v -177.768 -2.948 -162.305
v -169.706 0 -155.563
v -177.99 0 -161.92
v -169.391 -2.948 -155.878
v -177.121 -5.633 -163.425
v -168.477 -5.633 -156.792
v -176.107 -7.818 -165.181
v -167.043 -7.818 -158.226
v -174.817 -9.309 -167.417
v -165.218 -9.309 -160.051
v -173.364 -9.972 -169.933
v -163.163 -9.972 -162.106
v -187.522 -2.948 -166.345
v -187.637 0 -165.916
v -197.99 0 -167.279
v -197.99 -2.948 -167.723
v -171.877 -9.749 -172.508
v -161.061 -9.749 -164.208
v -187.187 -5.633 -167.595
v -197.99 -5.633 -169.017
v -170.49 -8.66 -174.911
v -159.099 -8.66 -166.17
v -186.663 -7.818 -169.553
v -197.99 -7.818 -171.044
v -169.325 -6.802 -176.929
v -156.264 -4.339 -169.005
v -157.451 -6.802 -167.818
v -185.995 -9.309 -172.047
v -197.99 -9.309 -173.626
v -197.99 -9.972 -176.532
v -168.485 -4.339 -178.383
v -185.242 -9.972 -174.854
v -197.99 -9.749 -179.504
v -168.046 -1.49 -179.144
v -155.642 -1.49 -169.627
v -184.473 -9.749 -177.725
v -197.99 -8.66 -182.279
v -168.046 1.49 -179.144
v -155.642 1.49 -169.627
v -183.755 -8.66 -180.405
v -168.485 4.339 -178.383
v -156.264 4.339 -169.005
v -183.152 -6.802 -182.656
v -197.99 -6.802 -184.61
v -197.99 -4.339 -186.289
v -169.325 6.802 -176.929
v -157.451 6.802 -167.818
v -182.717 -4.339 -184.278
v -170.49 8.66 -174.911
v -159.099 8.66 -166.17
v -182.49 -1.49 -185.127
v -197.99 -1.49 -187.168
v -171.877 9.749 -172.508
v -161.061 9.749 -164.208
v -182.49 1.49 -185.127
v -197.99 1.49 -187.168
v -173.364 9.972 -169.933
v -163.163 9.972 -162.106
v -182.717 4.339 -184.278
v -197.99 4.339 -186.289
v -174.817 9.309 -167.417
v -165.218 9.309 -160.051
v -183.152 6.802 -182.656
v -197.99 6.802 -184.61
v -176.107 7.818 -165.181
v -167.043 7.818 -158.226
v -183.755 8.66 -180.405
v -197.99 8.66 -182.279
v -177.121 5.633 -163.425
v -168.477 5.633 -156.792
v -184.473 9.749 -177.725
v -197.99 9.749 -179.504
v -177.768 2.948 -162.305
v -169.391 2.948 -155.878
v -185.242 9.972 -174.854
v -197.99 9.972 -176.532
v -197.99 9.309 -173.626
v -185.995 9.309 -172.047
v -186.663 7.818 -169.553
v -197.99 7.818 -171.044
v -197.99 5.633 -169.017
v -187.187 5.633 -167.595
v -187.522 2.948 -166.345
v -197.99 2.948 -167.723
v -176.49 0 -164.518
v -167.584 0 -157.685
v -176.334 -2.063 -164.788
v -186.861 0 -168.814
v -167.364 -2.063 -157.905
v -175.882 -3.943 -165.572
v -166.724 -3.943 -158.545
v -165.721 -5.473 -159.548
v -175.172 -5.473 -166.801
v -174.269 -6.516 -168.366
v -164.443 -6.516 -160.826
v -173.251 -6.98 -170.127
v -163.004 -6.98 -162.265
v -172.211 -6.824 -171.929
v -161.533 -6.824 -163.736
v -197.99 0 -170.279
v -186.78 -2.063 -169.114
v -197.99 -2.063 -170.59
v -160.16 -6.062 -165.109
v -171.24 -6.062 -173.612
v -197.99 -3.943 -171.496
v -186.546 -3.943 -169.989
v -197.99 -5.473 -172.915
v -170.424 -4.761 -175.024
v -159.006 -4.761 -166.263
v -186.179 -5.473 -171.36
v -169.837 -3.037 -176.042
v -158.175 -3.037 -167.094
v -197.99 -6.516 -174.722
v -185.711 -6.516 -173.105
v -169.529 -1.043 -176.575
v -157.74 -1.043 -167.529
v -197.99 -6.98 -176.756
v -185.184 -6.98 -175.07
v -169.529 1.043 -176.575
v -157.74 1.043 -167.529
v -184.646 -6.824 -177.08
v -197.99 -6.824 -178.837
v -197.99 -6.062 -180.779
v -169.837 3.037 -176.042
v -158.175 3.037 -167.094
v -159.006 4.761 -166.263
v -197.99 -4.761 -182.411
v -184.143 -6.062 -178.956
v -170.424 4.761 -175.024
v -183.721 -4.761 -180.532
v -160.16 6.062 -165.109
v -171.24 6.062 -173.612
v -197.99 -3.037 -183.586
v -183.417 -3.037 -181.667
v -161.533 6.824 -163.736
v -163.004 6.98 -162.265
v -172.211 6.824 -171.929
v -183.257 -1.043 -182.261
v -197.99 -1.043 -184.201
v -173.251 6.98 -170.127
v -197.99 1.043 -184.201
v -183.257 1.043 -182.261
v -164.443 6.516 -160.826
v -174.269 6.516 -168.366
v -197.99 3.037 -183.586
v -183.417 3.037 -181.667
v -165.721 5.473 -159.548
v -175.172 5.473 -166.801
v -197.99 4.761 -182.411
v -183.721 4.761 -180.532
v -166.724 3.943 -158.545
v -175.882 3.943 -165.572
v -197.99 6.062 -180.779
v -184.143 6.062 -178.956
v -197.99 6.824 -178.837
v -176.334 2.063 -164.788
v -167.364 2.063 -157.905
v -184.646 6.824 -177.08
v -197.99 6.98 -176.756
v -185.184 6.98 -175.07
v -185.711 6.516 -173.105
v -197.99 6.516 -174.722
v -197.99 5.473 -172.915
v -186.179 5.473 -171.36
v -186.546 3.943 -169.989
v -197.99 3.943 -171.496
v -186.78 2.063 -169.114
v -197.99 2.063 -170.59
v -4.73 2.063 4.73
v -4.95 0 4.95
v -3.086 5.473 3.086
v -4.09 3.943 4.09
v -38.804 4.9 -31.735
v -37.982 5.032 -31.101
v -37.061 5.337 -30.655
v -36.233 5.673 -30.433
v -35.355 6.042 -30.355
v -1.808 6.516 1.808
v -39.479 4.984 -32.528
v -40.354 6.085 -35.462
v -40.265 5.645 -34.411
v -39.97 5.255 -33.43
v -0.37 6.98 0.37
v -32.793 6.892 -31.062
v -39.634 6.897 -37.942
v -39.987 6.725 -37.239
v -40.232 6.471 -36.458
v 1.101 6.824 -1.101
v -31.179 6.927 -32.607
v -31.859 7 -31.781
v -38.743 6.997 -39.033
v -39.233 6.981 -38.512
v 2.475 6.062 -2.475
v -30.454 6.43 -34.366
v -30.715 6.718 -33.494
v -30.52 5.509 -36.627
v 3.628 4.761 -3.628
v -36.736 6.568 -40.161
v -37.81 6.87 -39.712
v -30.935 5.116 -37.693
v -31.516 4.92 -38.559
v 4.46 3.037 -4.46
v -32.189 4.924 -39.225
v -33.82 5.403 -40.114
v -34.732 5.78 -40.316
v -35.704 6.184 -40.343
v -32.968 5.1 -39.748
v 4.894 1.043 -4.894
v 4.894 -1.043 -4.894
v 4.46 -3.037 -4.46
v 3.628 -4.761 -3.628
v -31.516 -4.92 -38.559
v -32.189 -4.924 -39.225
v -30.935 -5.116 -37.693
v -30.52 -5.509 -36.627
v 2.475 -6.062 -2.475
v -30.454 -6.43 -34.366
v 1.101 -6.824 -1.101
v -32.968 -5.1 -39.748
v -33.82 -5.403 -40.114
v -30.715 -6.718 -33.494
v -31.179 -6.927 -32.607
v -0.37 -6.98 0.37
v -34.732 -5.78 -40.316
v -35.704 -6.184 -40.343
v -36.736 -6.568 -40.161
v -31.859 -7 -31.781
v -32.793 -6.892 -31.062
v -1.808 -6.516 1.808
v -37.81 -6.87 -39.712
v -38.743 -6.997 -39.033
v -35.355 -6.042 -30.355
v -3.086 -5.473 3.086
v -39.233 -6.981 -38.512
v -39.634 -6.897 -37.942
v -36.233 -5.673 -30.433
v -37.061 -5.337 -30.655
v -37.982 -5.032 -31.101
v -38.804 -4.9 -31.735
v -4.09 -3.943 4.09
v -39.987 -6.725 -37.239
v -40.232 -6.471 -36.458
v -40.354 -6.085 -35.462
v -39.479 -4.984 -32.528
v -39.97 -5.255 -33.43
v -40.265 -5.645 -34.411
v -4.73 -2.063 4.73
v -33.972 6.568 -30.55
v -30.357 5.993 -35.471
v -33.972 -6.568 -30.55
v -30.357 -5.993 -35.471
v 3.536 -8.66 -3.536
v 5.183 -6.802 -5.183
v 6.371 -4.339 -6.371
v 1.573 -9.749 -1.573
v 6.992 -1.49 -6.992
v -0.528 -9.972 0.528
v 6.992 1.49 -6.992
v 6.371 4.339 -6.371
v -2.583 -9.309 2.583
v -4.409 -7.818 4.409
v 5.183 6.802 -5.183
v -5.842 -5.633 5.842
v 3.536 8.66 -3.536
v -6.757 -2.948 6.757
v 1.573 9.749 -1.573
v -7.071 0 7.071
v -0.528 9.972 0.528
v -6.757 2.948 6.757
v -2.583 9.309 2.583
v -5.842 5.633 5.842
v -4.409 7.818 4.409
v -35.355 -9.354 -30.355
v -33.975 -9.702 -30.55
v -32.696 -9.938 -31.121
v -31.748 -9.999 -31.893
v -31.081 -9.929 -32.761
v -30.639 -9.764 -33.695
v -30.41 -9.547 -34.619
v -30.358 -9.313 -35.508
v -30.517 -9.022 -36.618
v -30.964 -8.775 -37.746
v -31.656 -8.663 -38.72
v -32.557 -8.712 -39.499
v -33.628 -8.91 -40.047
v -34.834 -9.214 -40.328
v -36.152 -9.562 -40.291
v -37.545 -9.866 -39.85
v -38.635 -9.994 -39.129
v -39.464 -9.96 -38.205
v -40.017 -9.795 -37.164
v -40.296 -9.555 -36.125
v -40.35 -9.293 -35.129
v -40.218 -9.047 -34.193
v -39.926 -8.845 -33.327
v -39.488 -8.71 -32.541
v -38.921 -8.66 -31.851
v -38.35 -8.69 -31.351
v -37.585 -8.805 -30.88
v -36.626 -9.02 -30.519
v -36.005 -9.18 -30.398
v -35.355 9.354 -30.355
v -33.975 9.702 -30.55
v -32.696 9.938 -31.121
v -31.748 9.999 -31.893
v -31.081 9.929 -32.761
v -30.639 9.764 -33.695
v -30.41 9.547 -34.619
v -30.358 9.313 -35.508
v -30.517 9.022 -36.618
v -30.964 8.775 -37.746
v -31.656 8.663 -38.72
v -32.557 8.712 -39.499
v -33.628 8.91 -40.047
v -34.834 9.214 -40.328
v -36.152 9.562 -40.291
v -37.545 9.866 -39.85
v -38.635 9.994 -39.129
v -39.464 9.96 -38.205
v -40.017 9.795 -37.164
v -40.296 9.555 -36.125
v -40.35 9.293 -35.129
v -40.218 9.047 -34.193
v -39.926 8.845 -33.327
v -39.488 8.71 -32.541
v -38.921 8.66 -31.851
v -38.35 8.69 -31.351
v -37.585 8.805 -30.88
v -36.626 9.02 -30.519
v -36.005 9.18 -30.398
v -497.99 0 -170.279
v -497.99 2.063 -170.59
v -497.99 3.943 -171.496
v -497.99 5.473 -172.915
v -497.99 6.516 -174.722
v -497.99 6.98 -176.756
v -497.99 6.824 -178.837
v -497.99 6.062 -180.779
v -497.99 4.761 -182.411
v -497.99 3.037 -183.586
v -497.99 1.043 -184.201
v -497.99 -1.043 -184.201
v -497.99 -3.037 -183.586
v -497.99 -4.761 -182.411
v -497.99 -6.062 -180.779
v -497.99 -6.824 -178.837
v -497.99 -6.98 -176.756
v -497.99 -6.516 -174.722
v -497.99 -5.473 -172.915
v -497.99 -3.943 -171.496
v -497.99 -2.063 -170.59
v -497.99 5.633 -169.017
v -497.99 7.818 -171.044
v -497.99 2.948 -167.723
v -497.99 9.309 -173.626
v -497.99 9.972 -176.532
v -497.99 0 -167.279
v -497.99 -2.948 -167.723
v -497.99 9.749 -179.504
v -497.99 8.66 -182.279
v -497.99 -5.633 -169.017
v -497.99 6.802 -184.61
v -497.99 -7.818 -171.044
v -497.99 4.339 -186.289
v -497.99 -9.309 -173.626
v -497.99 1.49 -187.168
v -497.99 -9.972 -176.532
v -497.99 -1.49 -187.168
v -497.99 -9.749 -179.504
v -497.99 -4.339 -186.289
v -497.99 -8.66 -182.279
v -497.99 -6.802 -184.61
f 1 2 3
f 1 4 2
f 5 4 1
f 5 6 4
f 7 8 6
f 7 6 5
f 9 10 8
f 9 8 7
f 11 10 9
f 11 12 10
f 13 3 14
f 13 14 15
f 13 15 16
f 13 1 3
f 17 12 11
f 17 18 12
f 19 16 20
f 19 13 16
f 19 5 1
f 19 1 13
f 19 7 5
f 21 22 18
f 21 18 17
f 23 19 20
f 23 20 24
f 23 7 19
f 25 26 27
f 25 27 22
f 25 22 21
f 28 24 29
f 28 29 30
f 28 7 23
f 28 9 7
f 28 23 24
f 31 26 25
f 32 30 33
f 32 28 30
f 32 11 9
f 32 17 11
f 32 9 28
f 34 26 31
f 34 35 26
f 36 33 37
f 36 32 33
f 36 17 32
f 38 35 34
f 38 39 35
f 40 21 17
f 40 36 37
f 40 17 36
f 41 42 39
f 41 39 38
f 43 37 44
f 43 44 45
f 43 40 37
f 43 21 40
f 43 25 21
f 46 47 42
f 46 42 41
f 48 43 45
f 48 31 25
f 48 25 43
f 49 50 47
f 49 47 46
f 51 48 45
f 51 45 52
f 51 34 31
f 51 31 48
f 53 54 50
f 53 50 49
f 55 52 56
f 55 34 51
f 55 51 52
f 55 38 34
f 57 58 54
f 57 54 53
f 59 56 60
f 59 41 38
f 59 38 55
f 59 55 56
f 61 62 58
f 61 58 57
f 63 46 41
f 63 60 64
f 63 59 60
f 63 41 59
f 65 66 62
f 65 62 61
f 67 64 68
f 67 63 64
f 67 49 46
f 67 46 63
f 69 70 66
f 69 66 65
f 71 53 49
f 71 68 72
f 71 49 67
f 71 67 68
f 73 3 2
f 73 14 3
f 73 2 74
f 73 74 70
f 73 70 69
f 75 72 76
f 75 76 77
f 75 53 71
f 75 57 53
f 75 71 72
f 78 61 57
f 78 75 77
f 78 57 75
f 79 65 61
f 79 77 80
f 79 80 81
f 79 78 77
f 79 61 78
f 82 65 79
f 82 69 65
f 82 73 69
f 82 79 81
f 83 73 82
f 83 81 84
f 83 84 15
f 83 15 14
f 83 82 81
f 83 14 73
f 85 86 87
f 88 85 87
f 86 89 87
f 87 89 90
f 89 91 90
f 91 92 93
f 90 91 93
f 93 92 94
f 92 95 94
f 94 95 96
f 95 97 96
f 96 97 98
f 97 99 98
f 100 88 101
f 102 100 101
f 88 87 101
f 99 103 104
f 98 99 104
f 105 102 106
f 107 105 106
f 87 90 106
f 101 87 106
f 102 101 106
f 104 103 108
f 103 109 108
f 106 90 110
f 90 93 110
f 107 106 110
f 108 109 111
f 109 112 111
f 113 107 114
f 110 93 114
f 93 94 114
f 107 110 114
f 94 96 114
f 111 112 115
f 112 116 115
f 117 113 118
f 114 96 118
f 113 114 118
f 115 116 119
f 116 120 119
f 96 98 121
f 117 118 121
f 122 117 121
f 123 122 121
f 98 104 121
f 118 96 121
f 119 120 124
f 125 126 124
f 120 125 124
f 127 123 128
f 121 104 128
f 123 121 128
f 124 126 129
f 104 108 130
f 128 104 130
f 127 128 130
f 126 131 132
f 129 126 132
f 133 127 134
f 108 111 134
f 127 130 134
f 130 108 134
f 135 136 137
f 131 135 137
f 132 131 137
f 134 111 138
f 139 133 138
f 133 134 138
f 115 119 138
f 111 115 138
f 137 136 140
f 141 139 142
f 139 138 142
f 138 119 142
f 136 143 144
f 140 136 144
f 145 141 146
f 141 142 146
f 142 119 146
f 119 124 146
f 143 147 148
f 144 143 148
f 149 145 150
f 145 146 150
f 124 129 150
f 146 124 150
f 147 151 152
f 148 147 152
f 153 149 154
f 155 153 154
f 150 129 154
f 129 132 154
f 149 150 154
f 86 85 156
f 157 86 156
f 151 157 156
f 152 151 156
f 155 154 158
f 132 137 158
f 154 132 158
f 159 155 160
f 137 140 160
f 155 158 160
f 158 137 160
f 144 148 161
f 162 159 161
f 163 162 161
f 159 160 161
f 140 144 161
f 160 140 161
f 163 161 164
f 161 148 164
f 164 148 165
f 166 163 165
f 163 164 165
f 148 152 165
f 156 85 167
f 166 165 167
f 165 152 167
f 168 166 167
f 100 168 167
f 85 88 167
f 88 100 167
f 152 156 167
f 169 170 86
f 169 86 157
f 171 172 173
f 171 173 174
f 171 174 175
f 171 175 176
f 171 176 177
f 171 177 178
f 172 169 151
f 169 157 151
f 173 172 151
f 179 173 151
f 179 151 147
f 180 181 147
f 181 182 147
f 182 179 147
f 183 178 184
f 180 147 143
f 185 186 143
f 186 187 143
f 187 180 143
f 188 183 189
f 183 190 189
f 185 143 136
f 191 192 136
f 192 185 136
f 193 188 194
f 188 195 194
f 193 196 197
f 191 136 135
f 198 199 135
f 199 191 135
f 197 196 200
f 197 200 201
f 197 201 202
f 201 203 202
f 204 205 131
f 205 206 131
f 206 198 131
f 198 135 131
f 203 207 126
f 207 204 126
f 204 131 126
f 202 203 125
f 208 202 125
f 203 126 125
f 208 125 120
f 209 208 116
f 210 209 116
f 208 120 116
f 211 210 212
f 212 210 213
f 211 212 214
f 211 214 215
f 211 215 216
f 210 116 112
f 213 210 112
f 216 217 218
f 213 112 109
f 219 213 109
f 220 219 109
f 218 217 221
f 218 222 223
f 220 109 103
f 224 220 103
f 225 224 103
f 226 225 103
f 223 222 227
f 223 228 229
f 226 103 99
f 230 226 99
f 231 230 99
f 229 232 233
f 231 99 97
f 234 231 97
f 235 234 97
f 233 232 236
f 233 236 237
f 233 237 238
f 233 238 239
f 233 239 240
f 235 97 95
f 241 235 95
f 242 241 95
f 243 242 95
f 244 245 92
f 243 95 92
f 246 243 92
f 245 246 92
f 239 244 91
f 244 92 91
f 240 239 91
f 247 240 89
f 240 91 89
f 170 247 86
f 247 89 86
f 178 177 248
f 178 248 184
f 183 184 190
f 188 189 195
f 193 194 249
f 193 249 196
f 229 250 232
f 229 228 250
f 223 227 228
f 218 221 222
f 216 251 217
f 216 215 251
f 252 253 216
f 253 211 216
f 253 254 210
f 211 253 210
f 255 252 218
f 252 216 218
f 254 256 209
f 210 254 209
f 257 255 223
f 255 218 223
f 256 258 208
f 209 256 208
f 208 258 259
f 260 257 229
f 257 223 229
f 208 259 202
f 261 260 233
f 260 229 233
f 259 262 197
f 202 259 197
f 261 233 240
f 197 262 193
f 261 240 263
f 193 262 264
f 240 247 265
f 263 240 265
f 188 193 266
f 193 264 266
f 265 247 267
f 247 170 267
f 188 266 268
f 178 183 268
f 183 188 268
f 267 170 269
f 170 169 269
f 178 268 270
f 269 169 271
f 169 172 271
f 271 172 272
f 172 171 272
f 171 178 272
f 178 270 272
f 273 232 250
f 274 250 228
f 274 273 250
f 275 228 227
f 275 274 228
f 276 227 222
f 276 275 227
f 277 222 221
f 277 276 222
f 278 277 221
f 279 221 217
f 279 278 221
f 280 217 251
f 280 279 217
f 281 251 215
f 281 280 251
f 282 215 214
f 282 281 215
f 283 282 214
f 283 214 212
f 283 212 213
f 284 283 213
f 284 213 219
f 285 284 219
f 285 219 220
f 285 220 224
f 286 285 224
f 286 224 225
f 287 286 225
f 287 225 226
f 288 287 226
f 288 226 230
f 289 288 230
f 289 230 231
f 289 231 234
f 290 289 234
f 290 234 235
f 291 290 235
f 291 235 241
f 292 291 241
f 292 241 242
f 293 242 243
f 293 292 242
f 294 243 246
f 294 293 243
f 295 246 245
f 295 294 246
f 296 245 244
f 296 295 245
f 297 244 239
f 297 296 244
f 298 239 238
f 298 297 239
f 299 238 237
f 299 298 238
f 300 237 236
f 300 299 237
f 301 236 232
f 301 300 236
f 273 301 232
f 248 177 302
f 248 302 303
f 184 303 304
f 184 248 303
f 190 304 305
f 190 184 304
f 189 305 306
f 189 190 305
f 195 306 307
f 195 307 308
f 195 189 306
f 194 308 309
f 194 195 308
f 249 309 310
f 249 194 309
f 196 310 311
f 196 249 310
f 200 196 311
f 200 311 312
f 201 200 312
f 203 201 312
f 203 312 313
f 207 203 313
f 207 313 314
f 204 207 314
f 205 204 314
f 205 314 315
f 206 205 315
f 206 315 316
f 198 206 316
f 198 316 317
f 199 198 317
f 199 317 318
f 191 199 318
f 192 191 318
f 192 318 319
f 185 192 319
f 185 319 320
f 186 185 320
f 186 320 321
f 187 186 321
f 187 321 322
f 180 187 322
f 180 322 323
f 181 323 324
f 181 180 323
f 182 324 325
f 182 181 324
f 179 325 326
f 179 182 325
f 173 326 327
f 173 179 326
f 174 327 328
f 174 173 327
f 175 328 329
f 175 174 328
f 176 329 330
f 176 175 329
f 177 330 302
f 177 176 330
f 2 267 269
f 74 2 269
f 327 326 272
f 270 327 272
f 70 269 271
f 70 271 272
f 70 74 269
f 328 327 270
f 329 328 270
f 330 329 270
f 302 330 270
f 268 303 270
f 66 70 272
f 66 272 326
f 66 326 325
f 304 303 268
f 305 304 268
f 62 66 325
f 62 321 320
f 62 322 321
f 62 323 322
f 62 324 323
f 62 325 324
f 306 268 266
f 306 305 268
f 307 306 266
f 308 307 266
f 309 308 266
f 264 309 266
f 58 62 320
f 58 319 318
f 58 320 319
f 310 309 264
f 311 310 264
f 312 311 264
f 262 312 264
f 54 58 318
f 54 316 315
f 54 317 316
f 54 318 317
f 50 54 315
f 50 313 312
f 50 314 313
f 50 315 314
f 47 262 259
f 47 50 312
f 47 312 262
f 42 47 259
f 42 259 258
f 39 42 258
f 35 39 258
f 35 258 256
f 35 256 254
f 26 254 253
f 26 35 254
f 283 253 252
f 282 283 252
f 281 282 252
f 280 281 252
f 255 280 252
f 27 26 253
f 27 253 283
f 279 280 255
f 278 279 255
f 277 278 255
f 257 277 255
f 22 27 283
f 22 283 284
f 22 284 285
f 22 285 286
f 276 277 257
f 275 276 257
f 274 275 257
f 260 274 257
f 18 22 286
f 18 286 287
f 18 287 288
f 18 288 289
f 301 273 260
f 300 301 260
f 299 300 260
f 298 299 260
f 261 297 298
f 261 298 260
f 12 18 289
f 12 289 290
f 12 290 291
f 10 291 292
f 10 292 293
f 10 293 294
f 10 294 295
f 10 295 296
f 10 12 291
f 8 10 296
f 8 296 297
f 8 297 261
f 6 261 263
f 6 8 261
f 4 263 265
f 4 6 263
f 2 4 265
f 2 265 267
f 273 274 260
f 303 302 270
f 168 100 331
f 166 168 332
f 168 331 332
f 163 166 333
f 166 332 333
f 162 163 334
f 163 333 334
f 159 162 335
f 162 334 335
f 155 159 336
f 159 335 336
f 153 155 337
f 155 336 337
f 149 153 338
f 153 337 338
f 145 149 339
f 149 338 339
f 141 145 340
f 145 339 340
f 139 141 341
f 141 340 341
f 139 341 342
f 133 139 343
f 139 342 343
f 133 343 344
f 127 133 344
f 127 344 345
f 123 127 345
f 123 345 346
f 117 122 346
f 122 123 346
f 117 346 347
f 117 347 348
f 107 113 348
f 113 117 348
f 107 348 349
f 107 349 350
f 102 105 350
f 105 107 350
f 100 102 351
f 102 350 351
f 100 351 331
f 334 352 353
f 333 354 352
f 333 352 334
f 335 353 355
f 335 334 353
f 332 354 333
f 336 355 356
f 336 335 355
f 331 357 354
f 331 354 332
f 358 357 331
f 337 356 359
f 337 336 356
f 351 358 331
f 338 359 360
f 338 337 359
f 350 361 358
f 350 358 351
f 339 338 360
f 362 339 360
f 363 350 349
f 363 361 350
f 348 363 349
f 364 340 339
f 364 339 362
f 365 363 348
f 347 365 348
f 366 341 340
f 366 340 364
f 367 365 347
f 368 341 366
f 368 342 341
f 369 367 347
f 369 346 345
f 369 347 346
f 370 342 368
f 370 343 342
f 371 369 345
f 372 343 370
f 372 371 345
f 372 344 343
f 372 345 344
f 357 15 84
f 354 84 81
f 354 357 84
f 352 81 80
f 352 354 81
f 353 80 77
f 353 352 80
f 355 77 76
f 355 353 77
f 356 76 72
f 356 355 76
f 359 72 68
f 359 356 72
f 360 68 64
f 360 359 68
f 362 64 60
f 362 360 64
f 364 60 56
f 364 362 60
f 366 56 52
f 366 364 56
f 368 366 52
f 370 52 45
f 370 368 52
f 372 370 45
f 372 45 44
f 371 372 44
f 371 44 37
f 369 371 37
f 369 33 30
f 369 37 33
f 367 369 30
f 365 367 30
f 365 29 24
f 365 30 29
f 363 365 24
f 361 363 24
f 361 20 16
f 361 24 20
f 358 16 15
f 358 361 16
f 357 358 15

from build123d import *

# Parameters (mm, degrees)
SWEEP_THIN1_PROFILE_R   = 10
SWEEP_THIN1_PROFILE_R_2 = 7
CUT_EXTRUDE1_DEPTH      = 533.134800358
CUT_EXTRUDE1_DEPTH_BACK = 533.134800358
SKETCH22_R              = 5


with BuildPart() as part:
    # Sweep-Thin1: sweep along a path in Sketch1
    with BuildLine(Plane(origin=(0, 0, 0), x_dir=(1, 0, 0), z_dir=(0, 1, 0))) as sweep_thin1_path:
        Line((0, 0), (-162.634559673, 162.634559673))
        ThreePointArc((-162.634559673, 162.634559673), (-178.855727114, 173.473197239), (-197.989898732, 177.279220614))
        Line((-197.989898732, 177.279220614), (-497.989898732, 177.279220614))
    # Sweep-Thin1 profile (on start of the path) → Sweep-Thin1 (sweep)
    with BuildSketch(Plane(origin=(0, 0, 0), x_dir=(-0.7071067811865488, 0, 0.7071067811865464), z_dir=(-0.7071067811865464, 0, -0.7071067811865488))):
        Circle(SWEEP_THIN1_PROFILE_R)
        Circle(SWEEP_THIN1_PROFILE_R_2, mode=Mode.SUBTRACT)
    sweep(path=sweep_thin1_path.line)

    # Sketch22 → Cut-Extrude1 (cut, two sides: drawn at the far end of the back side and taken through both)
    with BuildSketch(Plane(origin=(0, 0, 0), x_dir=(1, 0, 0), z_dir=(0, 1, 0)).offset(-CUT_EXTRUDE1_DEPTH_BACK)):
        with Locations(Location((-35.355339059, 35.355339059, 0), (0, 0, 270))):
            Circle(SKETCH22_R)
    extrude(amount=CUT_EXTRUDE1_DEPTH + CUT_EXTRUDE1_DEPTH_BACK, mode=Mode.SUBTRACT)


solid = part.part
